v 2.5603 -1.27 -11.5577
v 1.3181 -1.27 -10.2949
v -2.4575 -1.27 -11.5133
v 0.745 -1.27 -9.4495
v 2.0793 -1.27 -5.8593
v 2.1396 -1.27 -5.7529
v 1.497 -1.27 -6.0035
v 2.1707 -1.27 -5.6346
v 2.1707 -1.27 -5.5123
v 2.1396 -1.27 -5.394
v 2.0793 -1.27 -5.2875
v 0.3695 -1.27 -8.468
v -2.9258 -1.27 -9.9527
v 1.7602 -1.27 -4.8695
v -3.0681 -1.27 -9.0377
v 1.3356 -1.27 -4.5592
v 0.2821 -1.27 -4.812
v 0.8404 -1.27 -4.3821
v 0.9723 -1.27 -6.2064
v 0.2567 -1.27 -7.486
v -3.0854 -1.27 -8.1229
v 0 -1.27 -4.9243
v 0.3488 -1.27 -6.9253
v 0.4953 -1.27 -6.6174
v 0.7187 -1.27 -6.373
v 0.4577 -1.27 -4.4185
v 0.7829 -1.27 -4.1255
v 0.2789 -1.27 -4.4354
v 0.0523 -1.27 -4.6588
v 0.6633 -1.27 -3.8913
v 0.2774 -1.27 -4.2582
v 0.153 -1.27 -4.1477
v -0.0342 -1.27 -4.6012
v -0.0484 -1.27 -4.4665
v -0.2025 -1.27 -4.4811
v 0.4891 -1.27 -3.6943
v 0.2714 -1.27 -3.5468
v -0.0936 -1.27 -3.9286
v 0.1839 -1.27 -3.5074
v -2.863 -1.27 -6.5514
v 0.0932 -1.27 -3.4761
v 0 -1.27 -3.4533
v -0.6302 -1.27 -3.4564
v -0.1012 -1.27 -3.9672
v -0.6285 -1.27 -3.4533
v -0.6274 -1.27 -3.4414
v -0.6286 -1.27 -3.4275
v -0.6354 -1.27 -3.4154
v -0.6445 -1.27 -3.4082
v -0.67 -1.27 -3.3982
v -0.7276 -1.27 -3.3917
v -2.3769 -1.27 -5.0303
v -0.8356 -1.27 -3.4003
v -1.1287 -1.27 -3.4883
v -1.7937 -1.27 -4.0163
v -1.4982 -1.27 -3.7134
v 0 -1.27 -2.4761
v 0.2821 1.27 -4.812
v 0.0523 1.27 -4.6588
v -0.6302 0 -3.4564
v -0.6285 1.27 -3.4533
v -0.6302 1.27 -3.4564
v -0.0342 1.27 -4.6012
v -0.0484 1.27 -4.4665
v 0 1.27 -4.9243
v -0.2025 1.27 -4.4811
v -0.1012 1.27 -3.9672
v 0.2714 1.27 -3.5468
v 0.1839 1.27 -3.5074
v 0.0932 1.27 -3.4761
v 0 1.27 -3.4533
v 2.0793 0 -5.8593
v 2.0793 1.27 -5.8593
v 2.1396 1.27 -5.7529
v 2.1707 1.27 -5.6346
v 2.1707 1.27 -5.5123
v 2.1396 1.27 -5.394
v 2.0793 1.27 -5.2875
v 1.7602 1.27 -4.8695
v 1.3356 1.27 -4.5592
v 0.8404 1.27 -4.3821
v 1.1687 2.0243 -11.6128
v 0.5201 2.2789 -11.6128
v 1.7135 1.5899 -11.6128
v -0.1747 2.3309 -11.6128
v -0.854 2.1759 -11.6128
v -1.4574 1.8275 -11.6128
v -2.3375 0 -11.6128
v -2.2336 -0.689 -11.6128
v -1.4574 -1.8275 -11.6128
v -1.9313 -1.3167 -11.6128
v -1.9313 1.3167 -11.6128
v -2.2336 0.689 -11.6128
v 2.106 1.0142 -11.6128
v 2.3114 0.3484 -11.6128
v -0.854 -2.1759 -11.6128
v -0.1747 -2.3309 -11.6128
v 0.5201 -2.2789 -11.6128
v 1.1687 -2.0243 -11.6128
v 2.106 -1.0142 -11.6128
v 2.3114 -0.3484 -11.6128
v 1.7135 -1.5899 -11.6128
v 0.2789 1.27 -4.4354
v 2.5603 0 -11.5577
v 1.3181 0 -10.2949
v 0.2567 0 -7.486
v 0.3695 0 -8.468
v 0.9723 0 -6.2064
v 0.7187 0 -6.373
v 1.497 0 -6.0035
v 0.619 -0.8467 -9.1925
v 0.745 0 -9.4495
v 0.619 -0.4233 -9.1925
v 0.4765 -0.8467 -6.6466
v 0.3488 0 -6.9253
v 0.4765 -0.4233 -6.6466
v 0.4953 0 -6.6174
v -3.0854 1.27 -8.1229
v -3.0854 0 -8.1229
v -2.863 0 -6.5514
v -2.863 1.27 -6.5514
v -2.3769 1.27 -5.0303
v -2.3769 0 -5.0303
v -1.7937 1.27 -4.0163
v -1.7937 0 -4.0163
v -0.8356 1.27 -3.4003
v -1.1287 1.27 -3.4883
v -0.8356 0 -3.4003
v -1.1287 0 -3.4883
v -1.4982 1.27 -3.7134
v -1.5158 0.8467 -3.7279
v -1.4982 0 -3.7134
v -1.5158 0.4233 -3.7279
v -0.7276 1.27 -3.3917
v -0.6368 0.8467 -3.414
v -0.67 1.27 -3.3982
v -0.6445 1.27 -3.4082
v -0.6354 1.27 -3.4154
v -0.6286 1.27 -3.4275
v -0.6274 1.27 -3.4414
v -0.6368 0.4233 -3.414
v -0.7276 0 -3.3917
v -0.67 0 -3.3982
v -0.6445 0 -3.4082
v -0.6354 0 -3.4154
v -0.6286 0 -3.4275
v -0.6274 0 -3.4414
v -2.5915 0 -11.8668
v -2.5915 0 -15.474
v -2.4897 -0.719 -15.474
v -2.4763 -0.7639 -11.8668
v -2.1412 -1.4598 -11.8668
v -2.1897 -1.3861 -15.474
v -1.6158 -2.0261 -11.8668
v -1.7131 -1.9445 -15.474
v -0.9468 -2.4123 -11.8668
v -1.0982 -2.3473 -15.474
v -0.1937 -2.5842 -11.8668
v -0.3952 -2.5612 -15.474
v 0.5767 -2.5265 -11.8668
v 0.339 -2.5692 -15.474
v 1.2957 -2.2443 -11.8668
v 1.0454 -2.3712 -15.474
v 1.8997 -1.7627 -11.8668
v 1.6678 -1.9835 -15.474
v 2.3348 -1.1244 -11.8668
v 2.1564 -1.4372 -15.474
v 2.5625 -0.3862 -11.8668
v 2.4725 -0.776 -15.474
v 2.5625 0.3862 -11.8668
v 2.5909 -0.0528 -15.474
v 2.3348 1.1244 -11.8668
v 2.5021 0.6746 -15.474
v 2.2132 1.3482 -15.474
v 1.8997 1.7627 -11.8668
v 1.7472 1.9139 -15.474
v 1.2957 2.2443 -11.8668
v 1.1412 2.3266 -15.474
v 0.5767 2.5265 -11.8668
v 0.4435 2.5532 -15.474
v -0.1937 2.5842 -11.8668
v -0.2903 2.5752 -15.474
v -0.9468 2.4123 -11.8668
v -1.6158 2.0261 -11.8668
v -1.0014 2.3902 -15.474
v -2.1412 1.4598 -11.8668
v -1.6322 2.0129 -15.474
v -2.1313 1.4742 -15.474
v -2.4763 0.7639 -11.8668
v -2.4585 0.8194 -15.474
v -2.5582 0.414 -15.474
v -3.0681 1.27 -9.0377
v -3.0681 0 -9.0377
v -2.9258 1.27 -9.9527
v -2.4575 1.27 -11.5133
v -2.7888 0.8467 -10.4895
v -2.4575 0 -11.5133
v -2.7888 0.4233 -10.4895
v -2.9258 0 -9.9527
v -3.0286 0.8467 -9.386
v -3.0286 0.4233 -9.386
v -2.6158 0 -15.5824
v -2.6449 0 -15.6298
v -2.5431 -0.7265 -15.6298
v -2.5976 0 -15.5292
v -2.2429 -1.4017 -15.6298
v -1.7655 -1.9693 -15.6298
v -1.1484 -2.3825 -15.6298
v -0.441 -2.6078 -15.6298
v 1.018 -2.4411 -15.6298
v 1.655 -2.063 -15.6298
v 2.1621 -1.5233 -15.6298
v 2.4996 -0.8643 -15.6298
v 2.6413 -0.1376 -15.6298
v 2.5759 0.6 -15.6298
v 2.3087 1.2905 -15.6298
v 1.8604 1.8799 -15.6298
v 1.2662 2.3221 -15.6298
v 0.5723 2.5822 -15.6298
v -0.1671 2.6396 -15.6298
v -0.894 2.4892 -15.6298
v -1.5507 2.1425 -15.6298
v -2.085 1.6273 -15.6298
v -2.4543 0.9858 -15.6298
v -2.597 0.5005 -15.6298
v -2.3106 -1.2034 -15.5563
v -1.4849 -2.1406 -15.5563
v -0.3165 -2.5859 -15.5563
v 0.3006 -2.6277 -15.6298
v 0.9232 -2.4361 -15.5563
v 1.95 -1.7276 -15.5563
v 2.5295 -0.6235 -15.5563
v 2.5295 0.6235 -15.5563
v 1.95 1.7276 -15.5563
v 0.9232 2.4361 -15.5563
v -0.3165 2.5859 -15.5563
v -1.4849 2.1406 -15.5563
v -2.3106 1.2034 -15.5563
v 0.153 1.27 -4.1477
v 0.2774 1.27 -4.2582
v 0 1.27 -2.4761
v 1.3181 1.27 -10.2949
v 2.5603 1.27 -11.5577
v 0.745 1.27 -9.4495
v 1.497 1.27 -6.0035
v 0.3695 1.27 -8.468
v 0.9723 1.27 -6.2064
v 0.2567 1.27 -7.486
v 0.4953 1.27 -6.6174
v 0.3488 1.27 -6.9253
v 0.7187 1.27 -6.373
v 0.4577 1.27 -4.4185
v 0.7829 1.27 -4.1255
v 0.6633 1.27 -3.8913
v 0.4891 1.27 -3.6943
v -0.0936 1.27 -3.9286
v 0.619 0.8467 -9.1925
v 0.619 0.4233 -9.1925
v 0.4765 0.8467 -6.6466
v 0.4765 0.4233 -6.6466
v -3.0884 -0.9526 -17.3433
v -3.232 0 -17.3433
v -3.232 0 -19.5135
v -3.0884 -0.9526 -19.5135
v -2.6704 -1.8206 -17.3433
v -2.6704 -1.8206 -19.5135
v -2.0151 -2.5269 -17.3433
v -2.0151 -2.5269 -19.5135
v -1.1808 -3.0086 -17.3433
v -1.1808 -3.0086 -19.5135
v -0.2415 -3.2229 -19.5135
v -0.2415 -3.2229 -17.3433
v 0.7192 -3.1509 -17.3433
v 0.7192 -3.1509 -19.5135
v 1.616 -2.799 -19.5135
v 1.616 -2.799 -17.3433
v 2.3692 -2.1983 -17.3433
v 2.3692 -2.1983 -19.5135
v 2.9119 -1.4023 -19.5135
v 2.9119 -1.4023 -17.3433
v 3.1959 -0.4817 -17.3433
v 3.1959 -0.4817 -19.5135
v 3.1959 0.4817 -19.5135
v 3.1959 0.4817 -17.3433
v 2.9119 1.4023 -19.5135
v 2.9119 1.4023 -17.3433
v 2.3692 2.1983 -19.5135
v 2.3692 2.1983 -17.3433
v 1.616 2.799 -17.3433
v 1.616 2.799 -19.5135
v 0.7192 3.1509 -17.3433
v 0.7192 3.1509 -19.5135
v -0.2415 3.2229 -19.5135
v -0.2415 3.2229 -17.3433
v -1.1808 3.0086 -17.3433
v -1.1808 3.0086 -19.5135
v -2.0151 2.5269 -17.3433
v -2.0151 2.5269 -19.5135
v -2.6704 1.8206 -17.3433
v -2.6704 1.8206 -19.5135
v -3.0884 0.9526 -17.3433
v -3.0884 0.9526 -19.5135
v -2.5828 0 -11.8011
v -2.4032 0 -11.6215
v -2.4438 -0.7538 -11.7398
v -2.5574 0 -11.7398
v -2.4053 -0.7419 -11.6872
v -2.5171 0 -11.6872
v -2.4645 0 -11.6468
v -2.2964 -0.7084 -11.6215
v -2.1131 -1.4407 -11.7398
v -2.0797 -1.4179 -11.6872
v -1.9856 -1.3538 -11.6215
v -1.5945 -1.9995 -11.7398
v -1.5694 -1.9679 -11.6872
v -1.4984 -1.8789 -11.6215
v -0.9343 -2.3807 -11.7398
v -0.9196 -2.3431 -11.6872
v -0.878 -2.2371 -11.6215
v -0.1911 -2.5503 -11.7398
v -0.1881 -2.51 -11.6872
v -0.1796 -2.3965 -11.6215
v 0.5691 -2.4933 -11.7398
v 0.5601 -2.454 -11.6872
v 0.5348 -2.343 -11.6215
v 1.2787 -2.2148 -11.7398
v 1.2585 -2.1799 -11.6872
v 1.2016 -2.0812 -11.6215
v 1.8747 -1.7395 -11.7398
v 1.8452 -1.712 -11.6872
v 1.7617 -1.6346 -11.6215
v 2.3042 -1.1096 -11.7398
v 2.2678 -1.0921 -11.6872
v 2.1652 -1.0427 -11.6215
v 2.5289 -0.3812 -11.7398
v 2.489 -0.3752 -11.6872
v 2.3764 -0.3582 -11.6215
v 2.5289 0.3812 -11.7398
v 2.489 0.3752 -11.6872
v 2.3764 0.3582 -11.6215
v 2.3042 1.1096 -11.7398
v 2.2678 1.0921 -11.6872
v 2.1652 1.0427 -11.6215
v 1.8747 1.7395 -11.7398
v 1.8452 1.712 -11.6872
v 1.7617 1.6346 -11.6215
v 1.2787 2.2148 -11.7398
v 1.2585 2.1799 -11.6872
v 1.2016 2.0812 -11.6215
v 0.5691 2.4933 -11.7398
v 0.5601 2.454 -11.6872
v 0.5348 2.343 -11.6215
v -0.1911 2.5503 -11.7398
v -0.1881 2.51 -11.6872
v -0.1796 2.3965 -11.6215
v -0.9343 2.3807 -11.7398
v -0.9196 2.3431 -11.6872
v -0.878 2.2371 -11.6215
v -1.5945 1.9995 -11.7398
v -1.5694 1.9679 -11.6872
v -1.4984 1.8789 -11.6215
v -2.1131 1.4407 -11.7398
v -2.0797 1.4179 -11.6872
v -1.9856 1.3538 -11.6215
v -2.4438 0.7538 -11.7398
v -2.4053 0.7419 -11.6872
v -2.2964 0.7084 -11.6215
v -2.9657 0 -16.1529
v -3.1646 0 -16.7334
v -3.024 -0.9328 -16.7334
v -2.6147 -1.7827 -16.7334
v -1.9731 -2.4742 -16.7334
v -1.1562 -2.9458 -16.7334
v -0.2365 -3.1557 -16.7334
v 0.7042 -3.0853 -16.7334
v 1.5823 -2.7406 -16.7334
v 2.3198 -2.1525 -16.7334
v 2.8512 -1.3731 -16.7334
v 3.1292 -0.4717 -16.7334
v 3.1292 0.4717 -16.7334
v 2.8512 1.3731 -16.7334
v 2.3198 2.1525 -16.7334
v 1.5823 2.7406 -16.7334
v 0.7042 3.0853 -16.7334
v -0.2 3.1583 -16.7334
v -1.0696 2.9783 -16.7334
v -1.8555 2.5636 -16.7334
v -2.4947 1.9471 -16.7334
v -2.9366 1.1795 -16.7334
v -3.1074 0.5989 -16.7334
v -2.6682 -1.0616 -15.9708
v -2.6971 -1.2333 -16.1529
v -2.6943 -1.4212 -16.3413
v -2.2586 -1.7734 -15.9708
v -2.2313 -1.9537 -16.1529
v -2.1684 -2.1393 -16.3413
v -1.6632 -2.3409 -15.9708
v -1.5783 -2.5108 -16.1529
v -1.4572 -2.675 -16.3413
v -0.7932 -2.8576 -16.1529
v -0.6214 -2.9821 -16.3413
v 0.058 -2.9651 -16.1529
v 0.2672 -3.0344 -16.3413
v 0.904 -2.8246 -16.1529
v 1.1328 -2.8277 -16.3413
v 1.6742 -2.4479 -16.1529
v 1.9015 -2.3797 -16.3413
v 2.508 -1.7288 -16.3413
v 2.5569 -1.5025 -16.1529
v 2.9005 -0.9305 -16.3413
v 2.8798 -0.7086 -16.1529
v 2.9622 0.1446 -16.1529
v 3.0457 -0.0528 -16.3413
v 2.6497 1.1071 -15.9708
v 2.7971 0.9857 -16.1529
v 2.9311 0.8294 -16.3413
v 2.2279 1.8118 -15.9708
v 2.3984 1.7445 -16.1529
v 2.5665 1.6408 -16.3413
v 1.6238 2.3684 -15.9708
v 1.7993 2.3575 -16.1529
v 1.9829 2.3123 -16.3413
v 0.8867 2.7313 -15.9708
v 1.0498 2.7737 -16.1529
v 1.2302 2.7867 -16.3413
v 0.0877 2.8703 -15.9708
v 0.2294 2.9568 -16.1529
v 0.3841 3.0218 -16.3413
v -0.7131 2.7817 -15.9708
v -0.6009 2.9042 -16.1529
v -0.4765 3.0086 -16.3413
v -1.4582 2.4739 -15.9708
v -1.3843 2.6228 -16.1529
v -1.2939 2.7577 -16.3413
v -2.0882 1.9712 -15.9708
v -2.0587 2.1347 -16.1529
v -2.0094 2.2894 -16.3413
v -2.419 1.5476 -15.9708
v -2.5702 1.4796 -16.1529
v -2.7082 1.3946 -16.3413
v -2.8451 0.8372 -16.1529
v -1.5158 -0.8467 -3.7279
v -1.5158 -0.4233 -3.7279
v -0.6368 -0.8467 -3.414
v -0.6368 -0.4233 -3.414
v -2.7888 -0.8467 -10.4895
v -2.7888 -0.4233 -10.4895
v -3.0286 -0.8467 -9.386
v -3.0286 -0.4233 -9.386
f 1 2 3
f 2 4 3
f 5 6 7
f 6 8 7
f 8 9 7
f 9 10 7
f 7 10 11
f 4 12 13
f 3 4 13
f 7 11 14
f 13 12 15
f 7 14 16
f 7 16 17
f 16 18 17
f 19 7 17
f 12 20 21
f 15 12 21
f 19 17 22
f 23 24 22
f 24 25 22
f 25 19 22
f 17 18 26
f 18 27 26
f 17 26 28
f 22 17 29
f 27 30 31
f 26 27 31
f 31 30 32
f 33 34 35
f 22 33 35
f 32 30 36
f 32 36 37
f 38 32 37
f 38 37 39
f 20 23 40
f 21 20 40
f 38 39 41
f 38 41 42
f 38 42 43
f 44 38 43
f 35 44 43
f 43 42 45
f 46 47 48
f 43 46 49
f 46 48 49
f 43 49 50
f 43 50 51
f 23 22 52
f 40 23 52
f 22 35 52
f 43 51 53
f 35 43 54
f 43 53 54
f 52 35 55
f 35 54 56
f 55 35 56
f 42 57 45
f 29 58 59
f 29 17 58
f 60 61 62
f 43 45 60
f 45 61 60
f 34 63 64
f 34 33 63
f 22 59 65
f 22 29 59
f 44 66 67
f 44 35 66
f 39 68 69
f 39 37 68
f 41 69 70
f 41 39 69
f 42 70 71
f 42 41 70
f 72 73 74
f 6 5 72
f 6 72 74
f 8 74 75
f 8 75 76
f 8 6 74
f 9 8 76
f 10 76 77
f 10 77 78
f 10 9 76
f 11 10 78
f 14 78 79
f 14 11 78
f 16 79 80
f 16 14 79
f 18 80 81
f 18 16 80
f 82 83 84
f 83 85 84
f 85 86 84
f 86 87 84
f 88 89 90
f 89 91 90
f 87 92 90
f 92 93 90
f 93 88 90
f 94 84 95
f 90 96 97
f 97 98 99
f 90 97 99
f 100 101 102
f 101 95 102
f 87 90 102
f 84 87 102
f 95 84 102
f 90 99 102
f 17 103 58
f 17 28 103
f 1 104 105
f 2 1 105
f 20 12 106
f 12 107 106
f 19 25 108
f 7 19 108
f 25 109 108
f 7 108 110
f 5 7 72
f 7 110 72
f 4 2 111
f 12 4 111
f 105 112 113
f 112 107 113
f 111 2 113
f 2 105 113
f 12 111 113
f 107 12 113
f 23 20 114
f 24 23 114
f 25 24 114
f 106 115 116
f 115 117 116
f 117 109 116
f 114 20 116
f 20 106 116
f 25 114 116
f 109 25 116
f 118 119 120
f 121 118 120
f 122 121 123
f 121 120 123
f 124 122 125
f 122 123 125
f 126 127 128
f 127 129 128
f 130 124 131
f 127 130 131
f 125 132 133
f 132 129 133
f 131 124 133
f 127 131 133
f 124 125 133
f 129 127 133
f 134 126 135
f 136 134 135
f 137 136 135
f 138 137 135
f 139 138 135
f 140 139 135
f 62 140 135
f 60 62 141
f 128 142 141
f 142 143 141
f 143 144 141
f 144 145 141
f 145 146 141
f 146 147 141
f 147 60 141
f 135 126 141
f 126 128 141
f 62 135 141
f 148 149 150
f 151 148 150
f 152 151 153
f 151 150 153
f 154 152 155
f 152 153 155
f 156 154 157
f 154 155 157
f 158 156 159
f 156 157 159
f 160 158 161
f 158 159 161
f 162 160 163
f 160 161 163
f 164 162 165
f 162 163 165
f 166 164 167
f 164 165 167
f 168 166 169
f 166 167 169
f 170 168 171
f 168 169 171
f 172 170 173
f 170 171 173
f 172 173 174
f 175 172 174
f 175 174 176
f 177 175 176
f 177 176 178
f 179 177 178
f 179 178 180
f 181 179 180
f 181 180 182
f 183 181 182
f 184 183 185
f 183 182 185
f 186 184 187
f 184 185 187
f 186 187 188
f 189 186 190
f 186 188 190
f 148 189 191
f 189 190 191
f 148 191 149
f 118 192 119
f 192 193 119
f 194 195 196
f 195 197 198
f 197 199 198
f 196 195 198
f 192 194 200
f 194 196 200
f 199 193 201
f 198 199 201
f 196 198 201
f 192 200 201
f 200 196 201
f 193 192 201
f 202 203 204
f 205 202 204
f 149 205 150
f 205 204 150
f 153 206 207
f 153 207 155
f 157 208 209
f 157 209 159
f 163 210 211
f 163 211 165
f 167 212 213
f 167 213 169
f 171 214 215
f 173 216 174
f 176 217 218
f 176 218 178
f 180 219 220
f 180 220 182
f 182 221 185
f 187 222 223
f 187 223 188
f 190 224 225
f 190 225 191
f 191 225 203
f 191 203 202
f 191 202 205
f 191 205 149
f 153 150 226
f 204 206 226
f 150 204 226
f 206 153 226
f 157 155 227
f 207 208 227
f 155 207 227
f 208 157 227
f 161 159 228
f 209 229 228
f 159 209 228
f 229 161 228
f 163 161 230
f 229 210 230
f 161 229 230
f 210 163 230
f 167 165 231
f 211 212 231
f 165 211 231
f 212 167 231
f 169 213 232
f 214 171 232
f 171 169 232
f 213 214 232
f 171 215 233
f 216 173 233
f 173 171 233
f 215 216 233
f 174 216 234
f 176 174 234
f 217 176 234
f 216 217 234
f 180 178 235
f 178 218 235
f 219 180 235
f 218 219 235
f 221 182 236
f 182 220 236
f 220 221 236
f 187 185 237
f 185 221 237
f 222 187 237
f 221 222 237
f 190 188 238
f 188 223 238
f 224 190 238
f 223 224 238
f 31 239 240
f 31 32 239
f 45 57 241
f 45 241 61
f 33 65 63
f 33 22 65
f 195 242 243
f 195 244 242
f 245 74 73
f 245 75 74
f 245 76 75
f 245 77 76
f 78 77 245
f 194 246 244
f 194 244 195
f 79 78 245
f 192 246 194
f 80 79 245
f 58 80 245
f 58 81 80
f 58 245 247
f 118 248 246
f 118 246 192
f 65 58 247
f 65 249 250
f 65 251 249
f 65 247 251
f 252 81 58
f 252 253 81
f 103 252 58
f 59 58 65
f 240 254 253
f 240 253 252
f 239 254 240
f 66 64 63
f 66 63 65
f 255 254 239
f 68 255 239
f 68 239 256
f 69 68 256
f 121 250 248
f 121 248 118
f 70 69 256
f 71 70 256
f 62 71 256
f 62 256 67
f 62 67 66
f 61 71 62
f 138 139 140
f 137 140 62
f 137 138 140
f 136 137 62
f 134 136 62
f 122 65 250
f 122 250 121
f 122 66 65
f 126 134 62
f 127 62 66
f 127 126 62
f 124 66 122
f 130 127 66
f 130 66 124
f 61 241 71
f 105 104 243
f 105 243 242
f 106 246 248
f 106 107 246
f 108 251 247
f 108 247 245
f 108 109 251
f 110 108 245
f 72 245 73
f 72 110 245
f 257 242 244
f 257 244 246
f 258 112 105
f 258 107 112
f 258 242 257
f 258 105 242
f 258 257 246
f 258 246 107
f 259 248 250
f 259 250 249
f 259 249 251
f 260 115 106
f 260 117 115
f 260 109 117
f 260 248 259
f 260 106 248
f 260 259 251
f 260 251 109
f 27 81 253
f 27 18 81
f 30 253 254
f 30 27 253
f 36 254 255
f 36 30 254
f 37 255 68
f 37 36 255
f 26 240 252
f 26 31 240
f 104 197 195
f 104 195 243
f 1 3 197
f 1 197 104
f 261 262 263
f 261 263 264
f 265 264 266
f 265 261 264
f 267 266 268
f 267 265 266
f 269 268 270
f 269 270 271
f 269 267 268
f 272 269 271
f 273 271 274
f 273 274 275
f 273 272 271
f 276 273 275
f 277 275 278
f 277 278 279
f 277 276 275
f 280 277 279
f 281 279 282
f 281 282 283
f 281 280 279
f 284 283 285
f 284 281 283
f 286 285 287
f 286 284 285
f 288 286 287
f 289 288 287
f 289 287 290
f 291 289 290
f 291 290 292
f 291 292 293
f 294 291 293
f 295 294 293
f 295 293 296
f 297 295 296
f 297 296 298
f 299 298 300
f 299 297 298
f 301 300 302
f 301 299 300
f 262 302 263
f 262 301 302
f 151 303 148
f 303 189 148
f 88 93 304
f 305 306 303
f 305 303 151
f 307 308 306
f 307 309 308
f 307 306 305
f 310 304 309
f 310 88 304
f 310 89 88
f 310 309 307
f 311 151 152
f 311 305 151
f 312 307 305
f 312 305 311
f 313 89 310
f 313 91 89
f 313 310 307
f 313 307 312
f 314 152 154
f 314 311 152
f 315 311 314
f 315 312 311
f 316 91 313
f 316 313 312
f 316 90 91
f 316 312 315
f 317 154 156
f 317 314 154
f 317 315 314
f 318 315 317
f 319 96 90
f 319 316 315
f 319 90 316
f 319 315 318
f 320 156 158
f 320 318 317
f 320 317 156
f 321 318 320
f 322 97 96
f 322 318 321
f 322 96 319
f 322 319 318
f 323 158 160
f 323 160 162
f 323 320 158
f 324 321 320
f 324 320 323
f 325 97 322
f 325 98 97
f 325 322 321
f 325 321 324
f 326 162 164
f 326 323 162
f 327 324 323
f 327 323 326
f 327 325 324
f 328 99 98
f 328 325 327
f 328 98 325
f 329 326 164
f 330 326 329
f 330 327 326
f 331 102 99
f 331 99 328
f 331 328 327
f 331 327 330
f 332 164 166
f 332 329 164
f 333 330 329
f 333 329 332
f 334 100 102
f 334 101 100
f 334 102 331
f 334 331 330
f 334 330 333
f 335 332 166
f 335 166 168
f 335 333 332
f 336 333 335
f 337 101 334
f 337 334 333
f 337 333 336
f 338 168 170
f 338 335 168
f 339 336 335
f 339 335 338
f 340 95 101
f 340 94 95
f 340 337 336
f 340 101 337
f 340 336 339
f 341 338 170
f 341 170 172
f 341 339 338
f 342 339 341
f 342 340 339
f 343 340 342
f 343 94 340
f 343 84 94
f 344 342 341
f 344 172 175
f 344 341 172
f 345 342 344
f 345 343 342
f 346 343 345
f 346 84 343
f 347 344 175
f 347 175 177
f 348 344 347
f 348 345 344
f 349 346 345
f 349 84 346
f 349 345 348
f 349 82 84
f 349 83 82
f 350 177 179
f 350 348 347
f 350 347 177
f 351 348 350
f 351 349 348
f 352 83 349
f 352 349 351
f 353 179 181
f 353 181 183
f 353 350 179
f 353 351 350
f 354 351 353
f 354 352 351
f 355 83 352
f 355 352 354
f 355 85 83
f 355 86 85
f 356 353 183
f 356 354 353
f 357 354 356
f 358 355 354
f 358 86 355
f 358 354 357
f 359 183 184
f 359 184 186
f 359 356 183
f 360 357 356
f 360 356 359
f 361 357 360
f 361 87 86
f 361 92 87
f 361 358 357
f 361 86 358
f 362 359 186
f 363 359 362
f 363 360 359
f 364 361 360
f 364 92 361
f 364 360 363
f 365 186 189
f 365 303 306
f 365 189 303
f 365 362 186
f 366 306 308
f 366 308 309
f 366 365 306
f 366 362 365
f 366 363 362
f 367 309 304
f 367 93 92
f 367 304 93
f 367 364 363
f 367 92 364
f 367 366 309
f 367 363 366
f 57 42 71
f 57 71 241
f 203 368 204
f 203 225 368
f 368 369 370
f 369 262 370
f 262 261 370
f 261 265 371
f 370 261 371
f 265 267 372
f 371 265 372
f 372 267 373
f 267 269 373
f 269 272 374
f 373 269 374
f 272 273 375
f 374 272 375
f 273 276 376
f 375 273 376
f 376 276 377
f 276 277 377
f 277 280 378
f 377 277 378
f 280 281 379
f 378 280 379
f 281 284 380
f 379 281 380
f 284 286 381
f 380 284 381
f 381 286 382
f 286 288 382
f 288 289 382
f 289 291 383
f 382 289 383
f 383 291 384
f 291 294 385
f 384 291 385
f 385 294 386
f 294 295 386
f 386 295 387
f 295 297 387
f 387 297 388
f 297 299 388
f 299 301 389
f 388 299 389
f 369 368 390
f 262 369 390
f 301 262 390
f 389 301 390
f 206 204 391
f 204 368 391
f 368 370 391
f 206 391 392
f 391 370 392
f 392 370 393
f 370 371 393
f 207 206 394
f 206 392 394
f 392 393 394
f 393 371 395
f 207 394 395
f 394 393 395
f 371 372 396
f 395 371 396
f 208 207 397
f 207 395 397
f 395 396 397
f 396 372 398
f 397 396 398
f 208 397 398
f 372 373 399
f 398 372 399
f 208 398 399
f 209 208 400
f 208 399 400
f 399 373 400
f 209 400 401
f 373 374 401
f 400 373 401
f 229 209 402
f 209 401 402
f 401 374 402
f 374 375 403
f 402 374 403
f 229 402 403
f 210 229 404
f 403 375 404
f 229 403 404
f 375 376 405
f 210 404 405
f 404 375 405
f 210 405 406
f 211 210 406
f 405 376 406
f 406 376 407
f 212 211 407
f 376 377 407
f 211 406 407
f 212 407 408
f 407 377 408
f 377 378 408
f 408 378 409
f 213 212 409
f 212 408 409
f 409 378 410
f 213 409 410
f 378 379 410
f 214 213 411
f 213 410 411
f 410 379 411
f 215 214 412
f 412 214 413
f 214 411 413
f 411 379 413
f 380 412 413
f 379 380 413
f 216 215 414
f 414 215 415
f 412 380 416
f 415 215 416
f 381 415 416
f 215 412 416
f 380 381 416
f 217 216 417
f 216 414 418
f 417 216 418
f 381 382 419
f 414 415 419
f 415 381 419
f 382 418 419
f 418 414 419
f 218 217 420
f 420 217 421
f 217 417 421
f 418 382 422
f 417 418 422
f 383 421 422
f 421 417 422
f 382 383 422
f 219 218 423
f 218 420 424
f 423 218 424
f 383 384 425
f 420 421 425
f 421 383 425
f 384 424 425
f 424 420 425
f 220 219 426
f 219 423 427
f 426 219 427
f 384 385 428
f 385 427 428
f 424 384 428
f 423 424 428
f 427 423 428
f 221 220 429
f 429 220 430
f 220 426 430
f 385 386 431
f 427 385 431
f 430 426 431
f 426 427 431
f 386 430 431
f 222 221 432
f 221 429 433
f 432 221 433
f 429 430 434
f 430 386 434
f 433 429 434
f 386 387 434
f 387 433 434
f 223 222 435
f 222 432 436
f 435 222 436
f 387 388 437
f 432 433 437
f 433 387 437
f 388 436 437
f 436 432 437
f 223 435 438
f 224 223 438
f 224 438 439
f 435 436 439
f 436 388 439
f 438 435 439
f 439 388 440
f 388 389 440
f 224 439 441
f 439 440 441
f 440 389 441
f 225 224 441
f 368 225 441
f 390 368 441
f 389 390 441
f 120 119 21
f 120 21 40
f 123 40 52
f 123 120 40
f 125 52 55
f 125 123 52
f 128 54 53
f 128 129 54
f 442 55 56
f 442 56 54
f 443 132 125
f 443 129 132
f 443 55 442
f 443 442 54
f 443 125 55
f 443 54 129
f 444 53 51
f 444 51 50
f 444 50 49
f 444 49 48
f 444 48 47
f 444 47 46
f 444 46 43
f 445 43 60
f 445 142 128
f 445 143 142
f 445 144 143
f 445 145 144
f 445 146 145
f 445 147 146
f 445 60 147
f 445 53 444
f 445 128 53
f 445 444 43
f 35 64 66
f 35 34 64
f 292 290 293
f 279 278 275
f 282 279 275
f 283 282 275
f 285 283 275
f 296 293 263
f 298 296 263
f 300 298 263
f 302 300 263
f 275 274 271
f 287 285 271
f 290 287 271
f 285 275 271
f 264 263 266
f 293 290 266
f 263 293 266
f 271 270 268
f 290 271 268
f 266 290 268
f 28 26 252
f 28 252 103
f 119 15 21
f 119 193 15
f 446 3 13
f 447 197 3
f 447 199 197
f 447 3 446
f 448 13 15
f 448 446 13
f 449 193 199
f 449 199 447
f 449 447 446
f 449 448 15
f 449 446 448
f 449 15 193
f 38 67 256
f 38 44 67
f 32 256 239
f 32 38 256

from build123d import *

# Parameters (mm, degrees)
F0_W     = 0.6405061577
F0_H     = 3.9503388107
F3_DEPTH = 1.27
F5_R     = 0.254


# Not quite as in the source:
# - a fillet or chamfer that OpenCascade refuses, or shapes differently, is made with other operations: its cross-section is extruded or revolved along the edge and cut away or added


with BuildPart() as f1:
    # F0 (on Front) → F1 (revolve)
    with BuildSketch(Plane.XZ):
        Polygon((-2.5914753787, -19.5134952664), (0, -19.5134952664), (0, -11.6128176451), (-2.5914753787, -11.6128176451), (-2.5914753787, -15.5631564558), align=None)
        with Locations((-2.9117284575, -17.5383258611)):
            Rectangle(F0_W, F0_H)
    revolve(axis=Axis((0, 0, -15.5631564558), (0, 0, 1)))

    # F4: fillet of radius 2.794 on 1 edges, made by hand

    # F4_s1 → F4_t2 (revolve, cut)
    with BuildSketch(Plane.XZ):
        with BuildLine():
            ThreePointArc((-2.5914753787, -15.5631564558), (-3.0669830384, -16.397365106), (-3.2319815364, -17.3432969758))
            Line((-3.2319815364, -17.3432969758), (-3.2319815364, -15.5631564558))
            Line((-3.2319815364, -15.5631564558), (-2.5914753787, -15.5631564558))
        make_face()
    revolve(axis=Axis((0, 0, -15.5631564558), (0, 0, 1)), mode=Mode.SUBTRACT)

    # F5
    f5_edges = [f1.edges().sort_by_distance(p)[0] for p in [
        (-2.591475, 0, -13.587987),
        (2.591475, 0, -15.563156),
        (2.591475, 0, -11.612818),
    ]]
    fillet(f5_edges, radius=F5_R)


with BuildPart() as f3:
    # F2 (on Front) → F3 (new body, symmetric)
    with BuildSketch(Plane.XZ):
        with BuildLine():
            add(Edge.make_bspline(
                [(-2.4575470015, -11.5132899955), (-2.8040543568, -10.5028159539), (-3.1505617121, -9.4923419122), (-3.0854009092, -8.1228790805)],
                knots=[0, 0, 0, 0, 0.3547843289, 0.3547843289, 0.3547843289, 0.3547843289], degree=3))
            Line((-2.4575470015, -11.5132899955), (2.560271183, -11.5577178076))
            add(Edge.make_bspline(
                [(2.560271183, -11.5577178076), (1.8040367585, -10.8534037399), (0.3574469273, -9.5061316042), (0.0098981732, -6.329177487), (1.4316217442, -6.0063825673), (2.07934645, -5.859320052)],
                knots=[0, 0, 0, 0, 0.3735750804, 0.7146063376, 1, 1, 1, 1], degree=3))
            Line((2.07934645, -5.859320052), (1.7303656682, -5.5492422712))
            Line((1.7303656682, -5.5492422712), (0.4577149879, -4.418461669))
            Line((0.4577149879, -4.418461669), (0.2788823039, -4.4354375079))
            Line((0.2788823039, -4.4354375079), (0.2820669615, -4.8120045103))
            Line((0.2820669615, -4.8120045103), (0.0523033026, -4.6588287686))
            Line((0.0523033026, -4.6588287686), (0, -4.9243257381))
            Line((0, -4.9243257381), (-0.0341830133, -4.6011712362))
            Line((-0.0341830133, -4.6011712362), (-0.0484276129, -4.4665076697))
            Line((-0.0484276129, -4.4665076697), (-0.2024847872, -4.4811316731))
            Line((-0.2024847872, -4.4811316731), (-0.1012423936, -3.9672148204))
            Line((-0.1012423936, -3.9672148204), (-0.0936308252, -3.9285777125))
            Line((-0.0936308252, -3.9285777125), (-0.6285401519, -3.4532979677))
            Line((-0.6285401519, -3.4532979677), (-0.6301807522, -3.4564161403))
            Line((-0.6301807522, -3.4564161403), (-3.0854009092, -8.1228790805))
        make_face()
        with BuildLine():
            add(Edge.make_bspline(
                [(-3.0854009092, -8.1228790805), (-3.009593502, -6.5296601241), (-2.0935214667, -3.5207561612), (-0.6211493091, -3.3432954942), (-0.6258393316, -3.4402559318), (-0.6301807522, -3.4564161403)],
                knots=[0.3547843289, 0.3547843289, 0.3547843289, 0.3547843289, 0.7675367637, 0.9521252582, 0.9860341697, 0.9860341697, 0.9860341697, 0.9860341697], degree=3))
            Line((-3.0854009092, -8.1228790805), (-0.6301807522, -3.4564161403))
        make_face()
        with BuildLine():
            Line((1.7303656682, -5.5492422712), (2.07934645, -5.859320052))
            ThreePointArc((2.07934645, -5.859320052), (2.1746489219, -5.573413102), (2.07934645, -5.2875061519))
            Line((2.07934645, -5.2875061519), (1.7303656682, -5.5492422712))
        make_face()
        Polygon((0, -3.4532979677), (-0.6285401519, -3.4532979677), (-0.0936308252, -3.9285777125), align=None)
        Polygon((0, -2.4760859087), (-0.6285401519, -3.4532979677), (0, -3.4532979677), align=None)
        with BuildLine():
            Line((1.7303656682, -5.5492422712), (2.07934645, -5.2875061519))
            ThreePointArc((2.07934645, -5.2875061519), (1.5590688172, -4.699089309), (0.8404157707, -4.3821334839))
            Line((0.8404157707, -4.3821334839), (0.4577149879, -4.418461669))
            Line((0.4577149879, -4.418461669), (1.7303656682, -5.5492422712))
        make_face()
        with BuildLine():
            Line((0, -3.4532979677), (-0.0936308252, -3.9285777125))
            Line((-0.0936308252, -3.9285777125), (0.1529944372, -4.1477101634))
            Line((0.1529944372, -4.1477101634), (0.2713673383, -3.5468370845))
            ThreePointArc((0.2713673383, -3.5468370845), (0.1389025243, -3.4907292708), (0, -3.4532979677))
        make_face()
        with BuildLine():
            Line((0.4577149879, -4.418461669), (0.8404157707, -4.3821334839))
            ThreePointArc((0.8404157707, -4.3821334839), (0.6632892562, -3.891320245), (0.2713673383, -3.5468370845))
            Line((0.2713673383, -3.5468370845), (0.2773836709, -4.2582329759))
            Line((0.2773836709, -4.2582329759), (0.4577149879, -4.418461669))
        make_face()
        Polygon((0.2713673383, -3.5468370845), (0.1529944372, -4.1477101634), (0.2773836709, -4.2582329759), align=None)
    extrude(amount=F3_DEPTH, both=True)


solid = Compound([f1.part, f3.part])
